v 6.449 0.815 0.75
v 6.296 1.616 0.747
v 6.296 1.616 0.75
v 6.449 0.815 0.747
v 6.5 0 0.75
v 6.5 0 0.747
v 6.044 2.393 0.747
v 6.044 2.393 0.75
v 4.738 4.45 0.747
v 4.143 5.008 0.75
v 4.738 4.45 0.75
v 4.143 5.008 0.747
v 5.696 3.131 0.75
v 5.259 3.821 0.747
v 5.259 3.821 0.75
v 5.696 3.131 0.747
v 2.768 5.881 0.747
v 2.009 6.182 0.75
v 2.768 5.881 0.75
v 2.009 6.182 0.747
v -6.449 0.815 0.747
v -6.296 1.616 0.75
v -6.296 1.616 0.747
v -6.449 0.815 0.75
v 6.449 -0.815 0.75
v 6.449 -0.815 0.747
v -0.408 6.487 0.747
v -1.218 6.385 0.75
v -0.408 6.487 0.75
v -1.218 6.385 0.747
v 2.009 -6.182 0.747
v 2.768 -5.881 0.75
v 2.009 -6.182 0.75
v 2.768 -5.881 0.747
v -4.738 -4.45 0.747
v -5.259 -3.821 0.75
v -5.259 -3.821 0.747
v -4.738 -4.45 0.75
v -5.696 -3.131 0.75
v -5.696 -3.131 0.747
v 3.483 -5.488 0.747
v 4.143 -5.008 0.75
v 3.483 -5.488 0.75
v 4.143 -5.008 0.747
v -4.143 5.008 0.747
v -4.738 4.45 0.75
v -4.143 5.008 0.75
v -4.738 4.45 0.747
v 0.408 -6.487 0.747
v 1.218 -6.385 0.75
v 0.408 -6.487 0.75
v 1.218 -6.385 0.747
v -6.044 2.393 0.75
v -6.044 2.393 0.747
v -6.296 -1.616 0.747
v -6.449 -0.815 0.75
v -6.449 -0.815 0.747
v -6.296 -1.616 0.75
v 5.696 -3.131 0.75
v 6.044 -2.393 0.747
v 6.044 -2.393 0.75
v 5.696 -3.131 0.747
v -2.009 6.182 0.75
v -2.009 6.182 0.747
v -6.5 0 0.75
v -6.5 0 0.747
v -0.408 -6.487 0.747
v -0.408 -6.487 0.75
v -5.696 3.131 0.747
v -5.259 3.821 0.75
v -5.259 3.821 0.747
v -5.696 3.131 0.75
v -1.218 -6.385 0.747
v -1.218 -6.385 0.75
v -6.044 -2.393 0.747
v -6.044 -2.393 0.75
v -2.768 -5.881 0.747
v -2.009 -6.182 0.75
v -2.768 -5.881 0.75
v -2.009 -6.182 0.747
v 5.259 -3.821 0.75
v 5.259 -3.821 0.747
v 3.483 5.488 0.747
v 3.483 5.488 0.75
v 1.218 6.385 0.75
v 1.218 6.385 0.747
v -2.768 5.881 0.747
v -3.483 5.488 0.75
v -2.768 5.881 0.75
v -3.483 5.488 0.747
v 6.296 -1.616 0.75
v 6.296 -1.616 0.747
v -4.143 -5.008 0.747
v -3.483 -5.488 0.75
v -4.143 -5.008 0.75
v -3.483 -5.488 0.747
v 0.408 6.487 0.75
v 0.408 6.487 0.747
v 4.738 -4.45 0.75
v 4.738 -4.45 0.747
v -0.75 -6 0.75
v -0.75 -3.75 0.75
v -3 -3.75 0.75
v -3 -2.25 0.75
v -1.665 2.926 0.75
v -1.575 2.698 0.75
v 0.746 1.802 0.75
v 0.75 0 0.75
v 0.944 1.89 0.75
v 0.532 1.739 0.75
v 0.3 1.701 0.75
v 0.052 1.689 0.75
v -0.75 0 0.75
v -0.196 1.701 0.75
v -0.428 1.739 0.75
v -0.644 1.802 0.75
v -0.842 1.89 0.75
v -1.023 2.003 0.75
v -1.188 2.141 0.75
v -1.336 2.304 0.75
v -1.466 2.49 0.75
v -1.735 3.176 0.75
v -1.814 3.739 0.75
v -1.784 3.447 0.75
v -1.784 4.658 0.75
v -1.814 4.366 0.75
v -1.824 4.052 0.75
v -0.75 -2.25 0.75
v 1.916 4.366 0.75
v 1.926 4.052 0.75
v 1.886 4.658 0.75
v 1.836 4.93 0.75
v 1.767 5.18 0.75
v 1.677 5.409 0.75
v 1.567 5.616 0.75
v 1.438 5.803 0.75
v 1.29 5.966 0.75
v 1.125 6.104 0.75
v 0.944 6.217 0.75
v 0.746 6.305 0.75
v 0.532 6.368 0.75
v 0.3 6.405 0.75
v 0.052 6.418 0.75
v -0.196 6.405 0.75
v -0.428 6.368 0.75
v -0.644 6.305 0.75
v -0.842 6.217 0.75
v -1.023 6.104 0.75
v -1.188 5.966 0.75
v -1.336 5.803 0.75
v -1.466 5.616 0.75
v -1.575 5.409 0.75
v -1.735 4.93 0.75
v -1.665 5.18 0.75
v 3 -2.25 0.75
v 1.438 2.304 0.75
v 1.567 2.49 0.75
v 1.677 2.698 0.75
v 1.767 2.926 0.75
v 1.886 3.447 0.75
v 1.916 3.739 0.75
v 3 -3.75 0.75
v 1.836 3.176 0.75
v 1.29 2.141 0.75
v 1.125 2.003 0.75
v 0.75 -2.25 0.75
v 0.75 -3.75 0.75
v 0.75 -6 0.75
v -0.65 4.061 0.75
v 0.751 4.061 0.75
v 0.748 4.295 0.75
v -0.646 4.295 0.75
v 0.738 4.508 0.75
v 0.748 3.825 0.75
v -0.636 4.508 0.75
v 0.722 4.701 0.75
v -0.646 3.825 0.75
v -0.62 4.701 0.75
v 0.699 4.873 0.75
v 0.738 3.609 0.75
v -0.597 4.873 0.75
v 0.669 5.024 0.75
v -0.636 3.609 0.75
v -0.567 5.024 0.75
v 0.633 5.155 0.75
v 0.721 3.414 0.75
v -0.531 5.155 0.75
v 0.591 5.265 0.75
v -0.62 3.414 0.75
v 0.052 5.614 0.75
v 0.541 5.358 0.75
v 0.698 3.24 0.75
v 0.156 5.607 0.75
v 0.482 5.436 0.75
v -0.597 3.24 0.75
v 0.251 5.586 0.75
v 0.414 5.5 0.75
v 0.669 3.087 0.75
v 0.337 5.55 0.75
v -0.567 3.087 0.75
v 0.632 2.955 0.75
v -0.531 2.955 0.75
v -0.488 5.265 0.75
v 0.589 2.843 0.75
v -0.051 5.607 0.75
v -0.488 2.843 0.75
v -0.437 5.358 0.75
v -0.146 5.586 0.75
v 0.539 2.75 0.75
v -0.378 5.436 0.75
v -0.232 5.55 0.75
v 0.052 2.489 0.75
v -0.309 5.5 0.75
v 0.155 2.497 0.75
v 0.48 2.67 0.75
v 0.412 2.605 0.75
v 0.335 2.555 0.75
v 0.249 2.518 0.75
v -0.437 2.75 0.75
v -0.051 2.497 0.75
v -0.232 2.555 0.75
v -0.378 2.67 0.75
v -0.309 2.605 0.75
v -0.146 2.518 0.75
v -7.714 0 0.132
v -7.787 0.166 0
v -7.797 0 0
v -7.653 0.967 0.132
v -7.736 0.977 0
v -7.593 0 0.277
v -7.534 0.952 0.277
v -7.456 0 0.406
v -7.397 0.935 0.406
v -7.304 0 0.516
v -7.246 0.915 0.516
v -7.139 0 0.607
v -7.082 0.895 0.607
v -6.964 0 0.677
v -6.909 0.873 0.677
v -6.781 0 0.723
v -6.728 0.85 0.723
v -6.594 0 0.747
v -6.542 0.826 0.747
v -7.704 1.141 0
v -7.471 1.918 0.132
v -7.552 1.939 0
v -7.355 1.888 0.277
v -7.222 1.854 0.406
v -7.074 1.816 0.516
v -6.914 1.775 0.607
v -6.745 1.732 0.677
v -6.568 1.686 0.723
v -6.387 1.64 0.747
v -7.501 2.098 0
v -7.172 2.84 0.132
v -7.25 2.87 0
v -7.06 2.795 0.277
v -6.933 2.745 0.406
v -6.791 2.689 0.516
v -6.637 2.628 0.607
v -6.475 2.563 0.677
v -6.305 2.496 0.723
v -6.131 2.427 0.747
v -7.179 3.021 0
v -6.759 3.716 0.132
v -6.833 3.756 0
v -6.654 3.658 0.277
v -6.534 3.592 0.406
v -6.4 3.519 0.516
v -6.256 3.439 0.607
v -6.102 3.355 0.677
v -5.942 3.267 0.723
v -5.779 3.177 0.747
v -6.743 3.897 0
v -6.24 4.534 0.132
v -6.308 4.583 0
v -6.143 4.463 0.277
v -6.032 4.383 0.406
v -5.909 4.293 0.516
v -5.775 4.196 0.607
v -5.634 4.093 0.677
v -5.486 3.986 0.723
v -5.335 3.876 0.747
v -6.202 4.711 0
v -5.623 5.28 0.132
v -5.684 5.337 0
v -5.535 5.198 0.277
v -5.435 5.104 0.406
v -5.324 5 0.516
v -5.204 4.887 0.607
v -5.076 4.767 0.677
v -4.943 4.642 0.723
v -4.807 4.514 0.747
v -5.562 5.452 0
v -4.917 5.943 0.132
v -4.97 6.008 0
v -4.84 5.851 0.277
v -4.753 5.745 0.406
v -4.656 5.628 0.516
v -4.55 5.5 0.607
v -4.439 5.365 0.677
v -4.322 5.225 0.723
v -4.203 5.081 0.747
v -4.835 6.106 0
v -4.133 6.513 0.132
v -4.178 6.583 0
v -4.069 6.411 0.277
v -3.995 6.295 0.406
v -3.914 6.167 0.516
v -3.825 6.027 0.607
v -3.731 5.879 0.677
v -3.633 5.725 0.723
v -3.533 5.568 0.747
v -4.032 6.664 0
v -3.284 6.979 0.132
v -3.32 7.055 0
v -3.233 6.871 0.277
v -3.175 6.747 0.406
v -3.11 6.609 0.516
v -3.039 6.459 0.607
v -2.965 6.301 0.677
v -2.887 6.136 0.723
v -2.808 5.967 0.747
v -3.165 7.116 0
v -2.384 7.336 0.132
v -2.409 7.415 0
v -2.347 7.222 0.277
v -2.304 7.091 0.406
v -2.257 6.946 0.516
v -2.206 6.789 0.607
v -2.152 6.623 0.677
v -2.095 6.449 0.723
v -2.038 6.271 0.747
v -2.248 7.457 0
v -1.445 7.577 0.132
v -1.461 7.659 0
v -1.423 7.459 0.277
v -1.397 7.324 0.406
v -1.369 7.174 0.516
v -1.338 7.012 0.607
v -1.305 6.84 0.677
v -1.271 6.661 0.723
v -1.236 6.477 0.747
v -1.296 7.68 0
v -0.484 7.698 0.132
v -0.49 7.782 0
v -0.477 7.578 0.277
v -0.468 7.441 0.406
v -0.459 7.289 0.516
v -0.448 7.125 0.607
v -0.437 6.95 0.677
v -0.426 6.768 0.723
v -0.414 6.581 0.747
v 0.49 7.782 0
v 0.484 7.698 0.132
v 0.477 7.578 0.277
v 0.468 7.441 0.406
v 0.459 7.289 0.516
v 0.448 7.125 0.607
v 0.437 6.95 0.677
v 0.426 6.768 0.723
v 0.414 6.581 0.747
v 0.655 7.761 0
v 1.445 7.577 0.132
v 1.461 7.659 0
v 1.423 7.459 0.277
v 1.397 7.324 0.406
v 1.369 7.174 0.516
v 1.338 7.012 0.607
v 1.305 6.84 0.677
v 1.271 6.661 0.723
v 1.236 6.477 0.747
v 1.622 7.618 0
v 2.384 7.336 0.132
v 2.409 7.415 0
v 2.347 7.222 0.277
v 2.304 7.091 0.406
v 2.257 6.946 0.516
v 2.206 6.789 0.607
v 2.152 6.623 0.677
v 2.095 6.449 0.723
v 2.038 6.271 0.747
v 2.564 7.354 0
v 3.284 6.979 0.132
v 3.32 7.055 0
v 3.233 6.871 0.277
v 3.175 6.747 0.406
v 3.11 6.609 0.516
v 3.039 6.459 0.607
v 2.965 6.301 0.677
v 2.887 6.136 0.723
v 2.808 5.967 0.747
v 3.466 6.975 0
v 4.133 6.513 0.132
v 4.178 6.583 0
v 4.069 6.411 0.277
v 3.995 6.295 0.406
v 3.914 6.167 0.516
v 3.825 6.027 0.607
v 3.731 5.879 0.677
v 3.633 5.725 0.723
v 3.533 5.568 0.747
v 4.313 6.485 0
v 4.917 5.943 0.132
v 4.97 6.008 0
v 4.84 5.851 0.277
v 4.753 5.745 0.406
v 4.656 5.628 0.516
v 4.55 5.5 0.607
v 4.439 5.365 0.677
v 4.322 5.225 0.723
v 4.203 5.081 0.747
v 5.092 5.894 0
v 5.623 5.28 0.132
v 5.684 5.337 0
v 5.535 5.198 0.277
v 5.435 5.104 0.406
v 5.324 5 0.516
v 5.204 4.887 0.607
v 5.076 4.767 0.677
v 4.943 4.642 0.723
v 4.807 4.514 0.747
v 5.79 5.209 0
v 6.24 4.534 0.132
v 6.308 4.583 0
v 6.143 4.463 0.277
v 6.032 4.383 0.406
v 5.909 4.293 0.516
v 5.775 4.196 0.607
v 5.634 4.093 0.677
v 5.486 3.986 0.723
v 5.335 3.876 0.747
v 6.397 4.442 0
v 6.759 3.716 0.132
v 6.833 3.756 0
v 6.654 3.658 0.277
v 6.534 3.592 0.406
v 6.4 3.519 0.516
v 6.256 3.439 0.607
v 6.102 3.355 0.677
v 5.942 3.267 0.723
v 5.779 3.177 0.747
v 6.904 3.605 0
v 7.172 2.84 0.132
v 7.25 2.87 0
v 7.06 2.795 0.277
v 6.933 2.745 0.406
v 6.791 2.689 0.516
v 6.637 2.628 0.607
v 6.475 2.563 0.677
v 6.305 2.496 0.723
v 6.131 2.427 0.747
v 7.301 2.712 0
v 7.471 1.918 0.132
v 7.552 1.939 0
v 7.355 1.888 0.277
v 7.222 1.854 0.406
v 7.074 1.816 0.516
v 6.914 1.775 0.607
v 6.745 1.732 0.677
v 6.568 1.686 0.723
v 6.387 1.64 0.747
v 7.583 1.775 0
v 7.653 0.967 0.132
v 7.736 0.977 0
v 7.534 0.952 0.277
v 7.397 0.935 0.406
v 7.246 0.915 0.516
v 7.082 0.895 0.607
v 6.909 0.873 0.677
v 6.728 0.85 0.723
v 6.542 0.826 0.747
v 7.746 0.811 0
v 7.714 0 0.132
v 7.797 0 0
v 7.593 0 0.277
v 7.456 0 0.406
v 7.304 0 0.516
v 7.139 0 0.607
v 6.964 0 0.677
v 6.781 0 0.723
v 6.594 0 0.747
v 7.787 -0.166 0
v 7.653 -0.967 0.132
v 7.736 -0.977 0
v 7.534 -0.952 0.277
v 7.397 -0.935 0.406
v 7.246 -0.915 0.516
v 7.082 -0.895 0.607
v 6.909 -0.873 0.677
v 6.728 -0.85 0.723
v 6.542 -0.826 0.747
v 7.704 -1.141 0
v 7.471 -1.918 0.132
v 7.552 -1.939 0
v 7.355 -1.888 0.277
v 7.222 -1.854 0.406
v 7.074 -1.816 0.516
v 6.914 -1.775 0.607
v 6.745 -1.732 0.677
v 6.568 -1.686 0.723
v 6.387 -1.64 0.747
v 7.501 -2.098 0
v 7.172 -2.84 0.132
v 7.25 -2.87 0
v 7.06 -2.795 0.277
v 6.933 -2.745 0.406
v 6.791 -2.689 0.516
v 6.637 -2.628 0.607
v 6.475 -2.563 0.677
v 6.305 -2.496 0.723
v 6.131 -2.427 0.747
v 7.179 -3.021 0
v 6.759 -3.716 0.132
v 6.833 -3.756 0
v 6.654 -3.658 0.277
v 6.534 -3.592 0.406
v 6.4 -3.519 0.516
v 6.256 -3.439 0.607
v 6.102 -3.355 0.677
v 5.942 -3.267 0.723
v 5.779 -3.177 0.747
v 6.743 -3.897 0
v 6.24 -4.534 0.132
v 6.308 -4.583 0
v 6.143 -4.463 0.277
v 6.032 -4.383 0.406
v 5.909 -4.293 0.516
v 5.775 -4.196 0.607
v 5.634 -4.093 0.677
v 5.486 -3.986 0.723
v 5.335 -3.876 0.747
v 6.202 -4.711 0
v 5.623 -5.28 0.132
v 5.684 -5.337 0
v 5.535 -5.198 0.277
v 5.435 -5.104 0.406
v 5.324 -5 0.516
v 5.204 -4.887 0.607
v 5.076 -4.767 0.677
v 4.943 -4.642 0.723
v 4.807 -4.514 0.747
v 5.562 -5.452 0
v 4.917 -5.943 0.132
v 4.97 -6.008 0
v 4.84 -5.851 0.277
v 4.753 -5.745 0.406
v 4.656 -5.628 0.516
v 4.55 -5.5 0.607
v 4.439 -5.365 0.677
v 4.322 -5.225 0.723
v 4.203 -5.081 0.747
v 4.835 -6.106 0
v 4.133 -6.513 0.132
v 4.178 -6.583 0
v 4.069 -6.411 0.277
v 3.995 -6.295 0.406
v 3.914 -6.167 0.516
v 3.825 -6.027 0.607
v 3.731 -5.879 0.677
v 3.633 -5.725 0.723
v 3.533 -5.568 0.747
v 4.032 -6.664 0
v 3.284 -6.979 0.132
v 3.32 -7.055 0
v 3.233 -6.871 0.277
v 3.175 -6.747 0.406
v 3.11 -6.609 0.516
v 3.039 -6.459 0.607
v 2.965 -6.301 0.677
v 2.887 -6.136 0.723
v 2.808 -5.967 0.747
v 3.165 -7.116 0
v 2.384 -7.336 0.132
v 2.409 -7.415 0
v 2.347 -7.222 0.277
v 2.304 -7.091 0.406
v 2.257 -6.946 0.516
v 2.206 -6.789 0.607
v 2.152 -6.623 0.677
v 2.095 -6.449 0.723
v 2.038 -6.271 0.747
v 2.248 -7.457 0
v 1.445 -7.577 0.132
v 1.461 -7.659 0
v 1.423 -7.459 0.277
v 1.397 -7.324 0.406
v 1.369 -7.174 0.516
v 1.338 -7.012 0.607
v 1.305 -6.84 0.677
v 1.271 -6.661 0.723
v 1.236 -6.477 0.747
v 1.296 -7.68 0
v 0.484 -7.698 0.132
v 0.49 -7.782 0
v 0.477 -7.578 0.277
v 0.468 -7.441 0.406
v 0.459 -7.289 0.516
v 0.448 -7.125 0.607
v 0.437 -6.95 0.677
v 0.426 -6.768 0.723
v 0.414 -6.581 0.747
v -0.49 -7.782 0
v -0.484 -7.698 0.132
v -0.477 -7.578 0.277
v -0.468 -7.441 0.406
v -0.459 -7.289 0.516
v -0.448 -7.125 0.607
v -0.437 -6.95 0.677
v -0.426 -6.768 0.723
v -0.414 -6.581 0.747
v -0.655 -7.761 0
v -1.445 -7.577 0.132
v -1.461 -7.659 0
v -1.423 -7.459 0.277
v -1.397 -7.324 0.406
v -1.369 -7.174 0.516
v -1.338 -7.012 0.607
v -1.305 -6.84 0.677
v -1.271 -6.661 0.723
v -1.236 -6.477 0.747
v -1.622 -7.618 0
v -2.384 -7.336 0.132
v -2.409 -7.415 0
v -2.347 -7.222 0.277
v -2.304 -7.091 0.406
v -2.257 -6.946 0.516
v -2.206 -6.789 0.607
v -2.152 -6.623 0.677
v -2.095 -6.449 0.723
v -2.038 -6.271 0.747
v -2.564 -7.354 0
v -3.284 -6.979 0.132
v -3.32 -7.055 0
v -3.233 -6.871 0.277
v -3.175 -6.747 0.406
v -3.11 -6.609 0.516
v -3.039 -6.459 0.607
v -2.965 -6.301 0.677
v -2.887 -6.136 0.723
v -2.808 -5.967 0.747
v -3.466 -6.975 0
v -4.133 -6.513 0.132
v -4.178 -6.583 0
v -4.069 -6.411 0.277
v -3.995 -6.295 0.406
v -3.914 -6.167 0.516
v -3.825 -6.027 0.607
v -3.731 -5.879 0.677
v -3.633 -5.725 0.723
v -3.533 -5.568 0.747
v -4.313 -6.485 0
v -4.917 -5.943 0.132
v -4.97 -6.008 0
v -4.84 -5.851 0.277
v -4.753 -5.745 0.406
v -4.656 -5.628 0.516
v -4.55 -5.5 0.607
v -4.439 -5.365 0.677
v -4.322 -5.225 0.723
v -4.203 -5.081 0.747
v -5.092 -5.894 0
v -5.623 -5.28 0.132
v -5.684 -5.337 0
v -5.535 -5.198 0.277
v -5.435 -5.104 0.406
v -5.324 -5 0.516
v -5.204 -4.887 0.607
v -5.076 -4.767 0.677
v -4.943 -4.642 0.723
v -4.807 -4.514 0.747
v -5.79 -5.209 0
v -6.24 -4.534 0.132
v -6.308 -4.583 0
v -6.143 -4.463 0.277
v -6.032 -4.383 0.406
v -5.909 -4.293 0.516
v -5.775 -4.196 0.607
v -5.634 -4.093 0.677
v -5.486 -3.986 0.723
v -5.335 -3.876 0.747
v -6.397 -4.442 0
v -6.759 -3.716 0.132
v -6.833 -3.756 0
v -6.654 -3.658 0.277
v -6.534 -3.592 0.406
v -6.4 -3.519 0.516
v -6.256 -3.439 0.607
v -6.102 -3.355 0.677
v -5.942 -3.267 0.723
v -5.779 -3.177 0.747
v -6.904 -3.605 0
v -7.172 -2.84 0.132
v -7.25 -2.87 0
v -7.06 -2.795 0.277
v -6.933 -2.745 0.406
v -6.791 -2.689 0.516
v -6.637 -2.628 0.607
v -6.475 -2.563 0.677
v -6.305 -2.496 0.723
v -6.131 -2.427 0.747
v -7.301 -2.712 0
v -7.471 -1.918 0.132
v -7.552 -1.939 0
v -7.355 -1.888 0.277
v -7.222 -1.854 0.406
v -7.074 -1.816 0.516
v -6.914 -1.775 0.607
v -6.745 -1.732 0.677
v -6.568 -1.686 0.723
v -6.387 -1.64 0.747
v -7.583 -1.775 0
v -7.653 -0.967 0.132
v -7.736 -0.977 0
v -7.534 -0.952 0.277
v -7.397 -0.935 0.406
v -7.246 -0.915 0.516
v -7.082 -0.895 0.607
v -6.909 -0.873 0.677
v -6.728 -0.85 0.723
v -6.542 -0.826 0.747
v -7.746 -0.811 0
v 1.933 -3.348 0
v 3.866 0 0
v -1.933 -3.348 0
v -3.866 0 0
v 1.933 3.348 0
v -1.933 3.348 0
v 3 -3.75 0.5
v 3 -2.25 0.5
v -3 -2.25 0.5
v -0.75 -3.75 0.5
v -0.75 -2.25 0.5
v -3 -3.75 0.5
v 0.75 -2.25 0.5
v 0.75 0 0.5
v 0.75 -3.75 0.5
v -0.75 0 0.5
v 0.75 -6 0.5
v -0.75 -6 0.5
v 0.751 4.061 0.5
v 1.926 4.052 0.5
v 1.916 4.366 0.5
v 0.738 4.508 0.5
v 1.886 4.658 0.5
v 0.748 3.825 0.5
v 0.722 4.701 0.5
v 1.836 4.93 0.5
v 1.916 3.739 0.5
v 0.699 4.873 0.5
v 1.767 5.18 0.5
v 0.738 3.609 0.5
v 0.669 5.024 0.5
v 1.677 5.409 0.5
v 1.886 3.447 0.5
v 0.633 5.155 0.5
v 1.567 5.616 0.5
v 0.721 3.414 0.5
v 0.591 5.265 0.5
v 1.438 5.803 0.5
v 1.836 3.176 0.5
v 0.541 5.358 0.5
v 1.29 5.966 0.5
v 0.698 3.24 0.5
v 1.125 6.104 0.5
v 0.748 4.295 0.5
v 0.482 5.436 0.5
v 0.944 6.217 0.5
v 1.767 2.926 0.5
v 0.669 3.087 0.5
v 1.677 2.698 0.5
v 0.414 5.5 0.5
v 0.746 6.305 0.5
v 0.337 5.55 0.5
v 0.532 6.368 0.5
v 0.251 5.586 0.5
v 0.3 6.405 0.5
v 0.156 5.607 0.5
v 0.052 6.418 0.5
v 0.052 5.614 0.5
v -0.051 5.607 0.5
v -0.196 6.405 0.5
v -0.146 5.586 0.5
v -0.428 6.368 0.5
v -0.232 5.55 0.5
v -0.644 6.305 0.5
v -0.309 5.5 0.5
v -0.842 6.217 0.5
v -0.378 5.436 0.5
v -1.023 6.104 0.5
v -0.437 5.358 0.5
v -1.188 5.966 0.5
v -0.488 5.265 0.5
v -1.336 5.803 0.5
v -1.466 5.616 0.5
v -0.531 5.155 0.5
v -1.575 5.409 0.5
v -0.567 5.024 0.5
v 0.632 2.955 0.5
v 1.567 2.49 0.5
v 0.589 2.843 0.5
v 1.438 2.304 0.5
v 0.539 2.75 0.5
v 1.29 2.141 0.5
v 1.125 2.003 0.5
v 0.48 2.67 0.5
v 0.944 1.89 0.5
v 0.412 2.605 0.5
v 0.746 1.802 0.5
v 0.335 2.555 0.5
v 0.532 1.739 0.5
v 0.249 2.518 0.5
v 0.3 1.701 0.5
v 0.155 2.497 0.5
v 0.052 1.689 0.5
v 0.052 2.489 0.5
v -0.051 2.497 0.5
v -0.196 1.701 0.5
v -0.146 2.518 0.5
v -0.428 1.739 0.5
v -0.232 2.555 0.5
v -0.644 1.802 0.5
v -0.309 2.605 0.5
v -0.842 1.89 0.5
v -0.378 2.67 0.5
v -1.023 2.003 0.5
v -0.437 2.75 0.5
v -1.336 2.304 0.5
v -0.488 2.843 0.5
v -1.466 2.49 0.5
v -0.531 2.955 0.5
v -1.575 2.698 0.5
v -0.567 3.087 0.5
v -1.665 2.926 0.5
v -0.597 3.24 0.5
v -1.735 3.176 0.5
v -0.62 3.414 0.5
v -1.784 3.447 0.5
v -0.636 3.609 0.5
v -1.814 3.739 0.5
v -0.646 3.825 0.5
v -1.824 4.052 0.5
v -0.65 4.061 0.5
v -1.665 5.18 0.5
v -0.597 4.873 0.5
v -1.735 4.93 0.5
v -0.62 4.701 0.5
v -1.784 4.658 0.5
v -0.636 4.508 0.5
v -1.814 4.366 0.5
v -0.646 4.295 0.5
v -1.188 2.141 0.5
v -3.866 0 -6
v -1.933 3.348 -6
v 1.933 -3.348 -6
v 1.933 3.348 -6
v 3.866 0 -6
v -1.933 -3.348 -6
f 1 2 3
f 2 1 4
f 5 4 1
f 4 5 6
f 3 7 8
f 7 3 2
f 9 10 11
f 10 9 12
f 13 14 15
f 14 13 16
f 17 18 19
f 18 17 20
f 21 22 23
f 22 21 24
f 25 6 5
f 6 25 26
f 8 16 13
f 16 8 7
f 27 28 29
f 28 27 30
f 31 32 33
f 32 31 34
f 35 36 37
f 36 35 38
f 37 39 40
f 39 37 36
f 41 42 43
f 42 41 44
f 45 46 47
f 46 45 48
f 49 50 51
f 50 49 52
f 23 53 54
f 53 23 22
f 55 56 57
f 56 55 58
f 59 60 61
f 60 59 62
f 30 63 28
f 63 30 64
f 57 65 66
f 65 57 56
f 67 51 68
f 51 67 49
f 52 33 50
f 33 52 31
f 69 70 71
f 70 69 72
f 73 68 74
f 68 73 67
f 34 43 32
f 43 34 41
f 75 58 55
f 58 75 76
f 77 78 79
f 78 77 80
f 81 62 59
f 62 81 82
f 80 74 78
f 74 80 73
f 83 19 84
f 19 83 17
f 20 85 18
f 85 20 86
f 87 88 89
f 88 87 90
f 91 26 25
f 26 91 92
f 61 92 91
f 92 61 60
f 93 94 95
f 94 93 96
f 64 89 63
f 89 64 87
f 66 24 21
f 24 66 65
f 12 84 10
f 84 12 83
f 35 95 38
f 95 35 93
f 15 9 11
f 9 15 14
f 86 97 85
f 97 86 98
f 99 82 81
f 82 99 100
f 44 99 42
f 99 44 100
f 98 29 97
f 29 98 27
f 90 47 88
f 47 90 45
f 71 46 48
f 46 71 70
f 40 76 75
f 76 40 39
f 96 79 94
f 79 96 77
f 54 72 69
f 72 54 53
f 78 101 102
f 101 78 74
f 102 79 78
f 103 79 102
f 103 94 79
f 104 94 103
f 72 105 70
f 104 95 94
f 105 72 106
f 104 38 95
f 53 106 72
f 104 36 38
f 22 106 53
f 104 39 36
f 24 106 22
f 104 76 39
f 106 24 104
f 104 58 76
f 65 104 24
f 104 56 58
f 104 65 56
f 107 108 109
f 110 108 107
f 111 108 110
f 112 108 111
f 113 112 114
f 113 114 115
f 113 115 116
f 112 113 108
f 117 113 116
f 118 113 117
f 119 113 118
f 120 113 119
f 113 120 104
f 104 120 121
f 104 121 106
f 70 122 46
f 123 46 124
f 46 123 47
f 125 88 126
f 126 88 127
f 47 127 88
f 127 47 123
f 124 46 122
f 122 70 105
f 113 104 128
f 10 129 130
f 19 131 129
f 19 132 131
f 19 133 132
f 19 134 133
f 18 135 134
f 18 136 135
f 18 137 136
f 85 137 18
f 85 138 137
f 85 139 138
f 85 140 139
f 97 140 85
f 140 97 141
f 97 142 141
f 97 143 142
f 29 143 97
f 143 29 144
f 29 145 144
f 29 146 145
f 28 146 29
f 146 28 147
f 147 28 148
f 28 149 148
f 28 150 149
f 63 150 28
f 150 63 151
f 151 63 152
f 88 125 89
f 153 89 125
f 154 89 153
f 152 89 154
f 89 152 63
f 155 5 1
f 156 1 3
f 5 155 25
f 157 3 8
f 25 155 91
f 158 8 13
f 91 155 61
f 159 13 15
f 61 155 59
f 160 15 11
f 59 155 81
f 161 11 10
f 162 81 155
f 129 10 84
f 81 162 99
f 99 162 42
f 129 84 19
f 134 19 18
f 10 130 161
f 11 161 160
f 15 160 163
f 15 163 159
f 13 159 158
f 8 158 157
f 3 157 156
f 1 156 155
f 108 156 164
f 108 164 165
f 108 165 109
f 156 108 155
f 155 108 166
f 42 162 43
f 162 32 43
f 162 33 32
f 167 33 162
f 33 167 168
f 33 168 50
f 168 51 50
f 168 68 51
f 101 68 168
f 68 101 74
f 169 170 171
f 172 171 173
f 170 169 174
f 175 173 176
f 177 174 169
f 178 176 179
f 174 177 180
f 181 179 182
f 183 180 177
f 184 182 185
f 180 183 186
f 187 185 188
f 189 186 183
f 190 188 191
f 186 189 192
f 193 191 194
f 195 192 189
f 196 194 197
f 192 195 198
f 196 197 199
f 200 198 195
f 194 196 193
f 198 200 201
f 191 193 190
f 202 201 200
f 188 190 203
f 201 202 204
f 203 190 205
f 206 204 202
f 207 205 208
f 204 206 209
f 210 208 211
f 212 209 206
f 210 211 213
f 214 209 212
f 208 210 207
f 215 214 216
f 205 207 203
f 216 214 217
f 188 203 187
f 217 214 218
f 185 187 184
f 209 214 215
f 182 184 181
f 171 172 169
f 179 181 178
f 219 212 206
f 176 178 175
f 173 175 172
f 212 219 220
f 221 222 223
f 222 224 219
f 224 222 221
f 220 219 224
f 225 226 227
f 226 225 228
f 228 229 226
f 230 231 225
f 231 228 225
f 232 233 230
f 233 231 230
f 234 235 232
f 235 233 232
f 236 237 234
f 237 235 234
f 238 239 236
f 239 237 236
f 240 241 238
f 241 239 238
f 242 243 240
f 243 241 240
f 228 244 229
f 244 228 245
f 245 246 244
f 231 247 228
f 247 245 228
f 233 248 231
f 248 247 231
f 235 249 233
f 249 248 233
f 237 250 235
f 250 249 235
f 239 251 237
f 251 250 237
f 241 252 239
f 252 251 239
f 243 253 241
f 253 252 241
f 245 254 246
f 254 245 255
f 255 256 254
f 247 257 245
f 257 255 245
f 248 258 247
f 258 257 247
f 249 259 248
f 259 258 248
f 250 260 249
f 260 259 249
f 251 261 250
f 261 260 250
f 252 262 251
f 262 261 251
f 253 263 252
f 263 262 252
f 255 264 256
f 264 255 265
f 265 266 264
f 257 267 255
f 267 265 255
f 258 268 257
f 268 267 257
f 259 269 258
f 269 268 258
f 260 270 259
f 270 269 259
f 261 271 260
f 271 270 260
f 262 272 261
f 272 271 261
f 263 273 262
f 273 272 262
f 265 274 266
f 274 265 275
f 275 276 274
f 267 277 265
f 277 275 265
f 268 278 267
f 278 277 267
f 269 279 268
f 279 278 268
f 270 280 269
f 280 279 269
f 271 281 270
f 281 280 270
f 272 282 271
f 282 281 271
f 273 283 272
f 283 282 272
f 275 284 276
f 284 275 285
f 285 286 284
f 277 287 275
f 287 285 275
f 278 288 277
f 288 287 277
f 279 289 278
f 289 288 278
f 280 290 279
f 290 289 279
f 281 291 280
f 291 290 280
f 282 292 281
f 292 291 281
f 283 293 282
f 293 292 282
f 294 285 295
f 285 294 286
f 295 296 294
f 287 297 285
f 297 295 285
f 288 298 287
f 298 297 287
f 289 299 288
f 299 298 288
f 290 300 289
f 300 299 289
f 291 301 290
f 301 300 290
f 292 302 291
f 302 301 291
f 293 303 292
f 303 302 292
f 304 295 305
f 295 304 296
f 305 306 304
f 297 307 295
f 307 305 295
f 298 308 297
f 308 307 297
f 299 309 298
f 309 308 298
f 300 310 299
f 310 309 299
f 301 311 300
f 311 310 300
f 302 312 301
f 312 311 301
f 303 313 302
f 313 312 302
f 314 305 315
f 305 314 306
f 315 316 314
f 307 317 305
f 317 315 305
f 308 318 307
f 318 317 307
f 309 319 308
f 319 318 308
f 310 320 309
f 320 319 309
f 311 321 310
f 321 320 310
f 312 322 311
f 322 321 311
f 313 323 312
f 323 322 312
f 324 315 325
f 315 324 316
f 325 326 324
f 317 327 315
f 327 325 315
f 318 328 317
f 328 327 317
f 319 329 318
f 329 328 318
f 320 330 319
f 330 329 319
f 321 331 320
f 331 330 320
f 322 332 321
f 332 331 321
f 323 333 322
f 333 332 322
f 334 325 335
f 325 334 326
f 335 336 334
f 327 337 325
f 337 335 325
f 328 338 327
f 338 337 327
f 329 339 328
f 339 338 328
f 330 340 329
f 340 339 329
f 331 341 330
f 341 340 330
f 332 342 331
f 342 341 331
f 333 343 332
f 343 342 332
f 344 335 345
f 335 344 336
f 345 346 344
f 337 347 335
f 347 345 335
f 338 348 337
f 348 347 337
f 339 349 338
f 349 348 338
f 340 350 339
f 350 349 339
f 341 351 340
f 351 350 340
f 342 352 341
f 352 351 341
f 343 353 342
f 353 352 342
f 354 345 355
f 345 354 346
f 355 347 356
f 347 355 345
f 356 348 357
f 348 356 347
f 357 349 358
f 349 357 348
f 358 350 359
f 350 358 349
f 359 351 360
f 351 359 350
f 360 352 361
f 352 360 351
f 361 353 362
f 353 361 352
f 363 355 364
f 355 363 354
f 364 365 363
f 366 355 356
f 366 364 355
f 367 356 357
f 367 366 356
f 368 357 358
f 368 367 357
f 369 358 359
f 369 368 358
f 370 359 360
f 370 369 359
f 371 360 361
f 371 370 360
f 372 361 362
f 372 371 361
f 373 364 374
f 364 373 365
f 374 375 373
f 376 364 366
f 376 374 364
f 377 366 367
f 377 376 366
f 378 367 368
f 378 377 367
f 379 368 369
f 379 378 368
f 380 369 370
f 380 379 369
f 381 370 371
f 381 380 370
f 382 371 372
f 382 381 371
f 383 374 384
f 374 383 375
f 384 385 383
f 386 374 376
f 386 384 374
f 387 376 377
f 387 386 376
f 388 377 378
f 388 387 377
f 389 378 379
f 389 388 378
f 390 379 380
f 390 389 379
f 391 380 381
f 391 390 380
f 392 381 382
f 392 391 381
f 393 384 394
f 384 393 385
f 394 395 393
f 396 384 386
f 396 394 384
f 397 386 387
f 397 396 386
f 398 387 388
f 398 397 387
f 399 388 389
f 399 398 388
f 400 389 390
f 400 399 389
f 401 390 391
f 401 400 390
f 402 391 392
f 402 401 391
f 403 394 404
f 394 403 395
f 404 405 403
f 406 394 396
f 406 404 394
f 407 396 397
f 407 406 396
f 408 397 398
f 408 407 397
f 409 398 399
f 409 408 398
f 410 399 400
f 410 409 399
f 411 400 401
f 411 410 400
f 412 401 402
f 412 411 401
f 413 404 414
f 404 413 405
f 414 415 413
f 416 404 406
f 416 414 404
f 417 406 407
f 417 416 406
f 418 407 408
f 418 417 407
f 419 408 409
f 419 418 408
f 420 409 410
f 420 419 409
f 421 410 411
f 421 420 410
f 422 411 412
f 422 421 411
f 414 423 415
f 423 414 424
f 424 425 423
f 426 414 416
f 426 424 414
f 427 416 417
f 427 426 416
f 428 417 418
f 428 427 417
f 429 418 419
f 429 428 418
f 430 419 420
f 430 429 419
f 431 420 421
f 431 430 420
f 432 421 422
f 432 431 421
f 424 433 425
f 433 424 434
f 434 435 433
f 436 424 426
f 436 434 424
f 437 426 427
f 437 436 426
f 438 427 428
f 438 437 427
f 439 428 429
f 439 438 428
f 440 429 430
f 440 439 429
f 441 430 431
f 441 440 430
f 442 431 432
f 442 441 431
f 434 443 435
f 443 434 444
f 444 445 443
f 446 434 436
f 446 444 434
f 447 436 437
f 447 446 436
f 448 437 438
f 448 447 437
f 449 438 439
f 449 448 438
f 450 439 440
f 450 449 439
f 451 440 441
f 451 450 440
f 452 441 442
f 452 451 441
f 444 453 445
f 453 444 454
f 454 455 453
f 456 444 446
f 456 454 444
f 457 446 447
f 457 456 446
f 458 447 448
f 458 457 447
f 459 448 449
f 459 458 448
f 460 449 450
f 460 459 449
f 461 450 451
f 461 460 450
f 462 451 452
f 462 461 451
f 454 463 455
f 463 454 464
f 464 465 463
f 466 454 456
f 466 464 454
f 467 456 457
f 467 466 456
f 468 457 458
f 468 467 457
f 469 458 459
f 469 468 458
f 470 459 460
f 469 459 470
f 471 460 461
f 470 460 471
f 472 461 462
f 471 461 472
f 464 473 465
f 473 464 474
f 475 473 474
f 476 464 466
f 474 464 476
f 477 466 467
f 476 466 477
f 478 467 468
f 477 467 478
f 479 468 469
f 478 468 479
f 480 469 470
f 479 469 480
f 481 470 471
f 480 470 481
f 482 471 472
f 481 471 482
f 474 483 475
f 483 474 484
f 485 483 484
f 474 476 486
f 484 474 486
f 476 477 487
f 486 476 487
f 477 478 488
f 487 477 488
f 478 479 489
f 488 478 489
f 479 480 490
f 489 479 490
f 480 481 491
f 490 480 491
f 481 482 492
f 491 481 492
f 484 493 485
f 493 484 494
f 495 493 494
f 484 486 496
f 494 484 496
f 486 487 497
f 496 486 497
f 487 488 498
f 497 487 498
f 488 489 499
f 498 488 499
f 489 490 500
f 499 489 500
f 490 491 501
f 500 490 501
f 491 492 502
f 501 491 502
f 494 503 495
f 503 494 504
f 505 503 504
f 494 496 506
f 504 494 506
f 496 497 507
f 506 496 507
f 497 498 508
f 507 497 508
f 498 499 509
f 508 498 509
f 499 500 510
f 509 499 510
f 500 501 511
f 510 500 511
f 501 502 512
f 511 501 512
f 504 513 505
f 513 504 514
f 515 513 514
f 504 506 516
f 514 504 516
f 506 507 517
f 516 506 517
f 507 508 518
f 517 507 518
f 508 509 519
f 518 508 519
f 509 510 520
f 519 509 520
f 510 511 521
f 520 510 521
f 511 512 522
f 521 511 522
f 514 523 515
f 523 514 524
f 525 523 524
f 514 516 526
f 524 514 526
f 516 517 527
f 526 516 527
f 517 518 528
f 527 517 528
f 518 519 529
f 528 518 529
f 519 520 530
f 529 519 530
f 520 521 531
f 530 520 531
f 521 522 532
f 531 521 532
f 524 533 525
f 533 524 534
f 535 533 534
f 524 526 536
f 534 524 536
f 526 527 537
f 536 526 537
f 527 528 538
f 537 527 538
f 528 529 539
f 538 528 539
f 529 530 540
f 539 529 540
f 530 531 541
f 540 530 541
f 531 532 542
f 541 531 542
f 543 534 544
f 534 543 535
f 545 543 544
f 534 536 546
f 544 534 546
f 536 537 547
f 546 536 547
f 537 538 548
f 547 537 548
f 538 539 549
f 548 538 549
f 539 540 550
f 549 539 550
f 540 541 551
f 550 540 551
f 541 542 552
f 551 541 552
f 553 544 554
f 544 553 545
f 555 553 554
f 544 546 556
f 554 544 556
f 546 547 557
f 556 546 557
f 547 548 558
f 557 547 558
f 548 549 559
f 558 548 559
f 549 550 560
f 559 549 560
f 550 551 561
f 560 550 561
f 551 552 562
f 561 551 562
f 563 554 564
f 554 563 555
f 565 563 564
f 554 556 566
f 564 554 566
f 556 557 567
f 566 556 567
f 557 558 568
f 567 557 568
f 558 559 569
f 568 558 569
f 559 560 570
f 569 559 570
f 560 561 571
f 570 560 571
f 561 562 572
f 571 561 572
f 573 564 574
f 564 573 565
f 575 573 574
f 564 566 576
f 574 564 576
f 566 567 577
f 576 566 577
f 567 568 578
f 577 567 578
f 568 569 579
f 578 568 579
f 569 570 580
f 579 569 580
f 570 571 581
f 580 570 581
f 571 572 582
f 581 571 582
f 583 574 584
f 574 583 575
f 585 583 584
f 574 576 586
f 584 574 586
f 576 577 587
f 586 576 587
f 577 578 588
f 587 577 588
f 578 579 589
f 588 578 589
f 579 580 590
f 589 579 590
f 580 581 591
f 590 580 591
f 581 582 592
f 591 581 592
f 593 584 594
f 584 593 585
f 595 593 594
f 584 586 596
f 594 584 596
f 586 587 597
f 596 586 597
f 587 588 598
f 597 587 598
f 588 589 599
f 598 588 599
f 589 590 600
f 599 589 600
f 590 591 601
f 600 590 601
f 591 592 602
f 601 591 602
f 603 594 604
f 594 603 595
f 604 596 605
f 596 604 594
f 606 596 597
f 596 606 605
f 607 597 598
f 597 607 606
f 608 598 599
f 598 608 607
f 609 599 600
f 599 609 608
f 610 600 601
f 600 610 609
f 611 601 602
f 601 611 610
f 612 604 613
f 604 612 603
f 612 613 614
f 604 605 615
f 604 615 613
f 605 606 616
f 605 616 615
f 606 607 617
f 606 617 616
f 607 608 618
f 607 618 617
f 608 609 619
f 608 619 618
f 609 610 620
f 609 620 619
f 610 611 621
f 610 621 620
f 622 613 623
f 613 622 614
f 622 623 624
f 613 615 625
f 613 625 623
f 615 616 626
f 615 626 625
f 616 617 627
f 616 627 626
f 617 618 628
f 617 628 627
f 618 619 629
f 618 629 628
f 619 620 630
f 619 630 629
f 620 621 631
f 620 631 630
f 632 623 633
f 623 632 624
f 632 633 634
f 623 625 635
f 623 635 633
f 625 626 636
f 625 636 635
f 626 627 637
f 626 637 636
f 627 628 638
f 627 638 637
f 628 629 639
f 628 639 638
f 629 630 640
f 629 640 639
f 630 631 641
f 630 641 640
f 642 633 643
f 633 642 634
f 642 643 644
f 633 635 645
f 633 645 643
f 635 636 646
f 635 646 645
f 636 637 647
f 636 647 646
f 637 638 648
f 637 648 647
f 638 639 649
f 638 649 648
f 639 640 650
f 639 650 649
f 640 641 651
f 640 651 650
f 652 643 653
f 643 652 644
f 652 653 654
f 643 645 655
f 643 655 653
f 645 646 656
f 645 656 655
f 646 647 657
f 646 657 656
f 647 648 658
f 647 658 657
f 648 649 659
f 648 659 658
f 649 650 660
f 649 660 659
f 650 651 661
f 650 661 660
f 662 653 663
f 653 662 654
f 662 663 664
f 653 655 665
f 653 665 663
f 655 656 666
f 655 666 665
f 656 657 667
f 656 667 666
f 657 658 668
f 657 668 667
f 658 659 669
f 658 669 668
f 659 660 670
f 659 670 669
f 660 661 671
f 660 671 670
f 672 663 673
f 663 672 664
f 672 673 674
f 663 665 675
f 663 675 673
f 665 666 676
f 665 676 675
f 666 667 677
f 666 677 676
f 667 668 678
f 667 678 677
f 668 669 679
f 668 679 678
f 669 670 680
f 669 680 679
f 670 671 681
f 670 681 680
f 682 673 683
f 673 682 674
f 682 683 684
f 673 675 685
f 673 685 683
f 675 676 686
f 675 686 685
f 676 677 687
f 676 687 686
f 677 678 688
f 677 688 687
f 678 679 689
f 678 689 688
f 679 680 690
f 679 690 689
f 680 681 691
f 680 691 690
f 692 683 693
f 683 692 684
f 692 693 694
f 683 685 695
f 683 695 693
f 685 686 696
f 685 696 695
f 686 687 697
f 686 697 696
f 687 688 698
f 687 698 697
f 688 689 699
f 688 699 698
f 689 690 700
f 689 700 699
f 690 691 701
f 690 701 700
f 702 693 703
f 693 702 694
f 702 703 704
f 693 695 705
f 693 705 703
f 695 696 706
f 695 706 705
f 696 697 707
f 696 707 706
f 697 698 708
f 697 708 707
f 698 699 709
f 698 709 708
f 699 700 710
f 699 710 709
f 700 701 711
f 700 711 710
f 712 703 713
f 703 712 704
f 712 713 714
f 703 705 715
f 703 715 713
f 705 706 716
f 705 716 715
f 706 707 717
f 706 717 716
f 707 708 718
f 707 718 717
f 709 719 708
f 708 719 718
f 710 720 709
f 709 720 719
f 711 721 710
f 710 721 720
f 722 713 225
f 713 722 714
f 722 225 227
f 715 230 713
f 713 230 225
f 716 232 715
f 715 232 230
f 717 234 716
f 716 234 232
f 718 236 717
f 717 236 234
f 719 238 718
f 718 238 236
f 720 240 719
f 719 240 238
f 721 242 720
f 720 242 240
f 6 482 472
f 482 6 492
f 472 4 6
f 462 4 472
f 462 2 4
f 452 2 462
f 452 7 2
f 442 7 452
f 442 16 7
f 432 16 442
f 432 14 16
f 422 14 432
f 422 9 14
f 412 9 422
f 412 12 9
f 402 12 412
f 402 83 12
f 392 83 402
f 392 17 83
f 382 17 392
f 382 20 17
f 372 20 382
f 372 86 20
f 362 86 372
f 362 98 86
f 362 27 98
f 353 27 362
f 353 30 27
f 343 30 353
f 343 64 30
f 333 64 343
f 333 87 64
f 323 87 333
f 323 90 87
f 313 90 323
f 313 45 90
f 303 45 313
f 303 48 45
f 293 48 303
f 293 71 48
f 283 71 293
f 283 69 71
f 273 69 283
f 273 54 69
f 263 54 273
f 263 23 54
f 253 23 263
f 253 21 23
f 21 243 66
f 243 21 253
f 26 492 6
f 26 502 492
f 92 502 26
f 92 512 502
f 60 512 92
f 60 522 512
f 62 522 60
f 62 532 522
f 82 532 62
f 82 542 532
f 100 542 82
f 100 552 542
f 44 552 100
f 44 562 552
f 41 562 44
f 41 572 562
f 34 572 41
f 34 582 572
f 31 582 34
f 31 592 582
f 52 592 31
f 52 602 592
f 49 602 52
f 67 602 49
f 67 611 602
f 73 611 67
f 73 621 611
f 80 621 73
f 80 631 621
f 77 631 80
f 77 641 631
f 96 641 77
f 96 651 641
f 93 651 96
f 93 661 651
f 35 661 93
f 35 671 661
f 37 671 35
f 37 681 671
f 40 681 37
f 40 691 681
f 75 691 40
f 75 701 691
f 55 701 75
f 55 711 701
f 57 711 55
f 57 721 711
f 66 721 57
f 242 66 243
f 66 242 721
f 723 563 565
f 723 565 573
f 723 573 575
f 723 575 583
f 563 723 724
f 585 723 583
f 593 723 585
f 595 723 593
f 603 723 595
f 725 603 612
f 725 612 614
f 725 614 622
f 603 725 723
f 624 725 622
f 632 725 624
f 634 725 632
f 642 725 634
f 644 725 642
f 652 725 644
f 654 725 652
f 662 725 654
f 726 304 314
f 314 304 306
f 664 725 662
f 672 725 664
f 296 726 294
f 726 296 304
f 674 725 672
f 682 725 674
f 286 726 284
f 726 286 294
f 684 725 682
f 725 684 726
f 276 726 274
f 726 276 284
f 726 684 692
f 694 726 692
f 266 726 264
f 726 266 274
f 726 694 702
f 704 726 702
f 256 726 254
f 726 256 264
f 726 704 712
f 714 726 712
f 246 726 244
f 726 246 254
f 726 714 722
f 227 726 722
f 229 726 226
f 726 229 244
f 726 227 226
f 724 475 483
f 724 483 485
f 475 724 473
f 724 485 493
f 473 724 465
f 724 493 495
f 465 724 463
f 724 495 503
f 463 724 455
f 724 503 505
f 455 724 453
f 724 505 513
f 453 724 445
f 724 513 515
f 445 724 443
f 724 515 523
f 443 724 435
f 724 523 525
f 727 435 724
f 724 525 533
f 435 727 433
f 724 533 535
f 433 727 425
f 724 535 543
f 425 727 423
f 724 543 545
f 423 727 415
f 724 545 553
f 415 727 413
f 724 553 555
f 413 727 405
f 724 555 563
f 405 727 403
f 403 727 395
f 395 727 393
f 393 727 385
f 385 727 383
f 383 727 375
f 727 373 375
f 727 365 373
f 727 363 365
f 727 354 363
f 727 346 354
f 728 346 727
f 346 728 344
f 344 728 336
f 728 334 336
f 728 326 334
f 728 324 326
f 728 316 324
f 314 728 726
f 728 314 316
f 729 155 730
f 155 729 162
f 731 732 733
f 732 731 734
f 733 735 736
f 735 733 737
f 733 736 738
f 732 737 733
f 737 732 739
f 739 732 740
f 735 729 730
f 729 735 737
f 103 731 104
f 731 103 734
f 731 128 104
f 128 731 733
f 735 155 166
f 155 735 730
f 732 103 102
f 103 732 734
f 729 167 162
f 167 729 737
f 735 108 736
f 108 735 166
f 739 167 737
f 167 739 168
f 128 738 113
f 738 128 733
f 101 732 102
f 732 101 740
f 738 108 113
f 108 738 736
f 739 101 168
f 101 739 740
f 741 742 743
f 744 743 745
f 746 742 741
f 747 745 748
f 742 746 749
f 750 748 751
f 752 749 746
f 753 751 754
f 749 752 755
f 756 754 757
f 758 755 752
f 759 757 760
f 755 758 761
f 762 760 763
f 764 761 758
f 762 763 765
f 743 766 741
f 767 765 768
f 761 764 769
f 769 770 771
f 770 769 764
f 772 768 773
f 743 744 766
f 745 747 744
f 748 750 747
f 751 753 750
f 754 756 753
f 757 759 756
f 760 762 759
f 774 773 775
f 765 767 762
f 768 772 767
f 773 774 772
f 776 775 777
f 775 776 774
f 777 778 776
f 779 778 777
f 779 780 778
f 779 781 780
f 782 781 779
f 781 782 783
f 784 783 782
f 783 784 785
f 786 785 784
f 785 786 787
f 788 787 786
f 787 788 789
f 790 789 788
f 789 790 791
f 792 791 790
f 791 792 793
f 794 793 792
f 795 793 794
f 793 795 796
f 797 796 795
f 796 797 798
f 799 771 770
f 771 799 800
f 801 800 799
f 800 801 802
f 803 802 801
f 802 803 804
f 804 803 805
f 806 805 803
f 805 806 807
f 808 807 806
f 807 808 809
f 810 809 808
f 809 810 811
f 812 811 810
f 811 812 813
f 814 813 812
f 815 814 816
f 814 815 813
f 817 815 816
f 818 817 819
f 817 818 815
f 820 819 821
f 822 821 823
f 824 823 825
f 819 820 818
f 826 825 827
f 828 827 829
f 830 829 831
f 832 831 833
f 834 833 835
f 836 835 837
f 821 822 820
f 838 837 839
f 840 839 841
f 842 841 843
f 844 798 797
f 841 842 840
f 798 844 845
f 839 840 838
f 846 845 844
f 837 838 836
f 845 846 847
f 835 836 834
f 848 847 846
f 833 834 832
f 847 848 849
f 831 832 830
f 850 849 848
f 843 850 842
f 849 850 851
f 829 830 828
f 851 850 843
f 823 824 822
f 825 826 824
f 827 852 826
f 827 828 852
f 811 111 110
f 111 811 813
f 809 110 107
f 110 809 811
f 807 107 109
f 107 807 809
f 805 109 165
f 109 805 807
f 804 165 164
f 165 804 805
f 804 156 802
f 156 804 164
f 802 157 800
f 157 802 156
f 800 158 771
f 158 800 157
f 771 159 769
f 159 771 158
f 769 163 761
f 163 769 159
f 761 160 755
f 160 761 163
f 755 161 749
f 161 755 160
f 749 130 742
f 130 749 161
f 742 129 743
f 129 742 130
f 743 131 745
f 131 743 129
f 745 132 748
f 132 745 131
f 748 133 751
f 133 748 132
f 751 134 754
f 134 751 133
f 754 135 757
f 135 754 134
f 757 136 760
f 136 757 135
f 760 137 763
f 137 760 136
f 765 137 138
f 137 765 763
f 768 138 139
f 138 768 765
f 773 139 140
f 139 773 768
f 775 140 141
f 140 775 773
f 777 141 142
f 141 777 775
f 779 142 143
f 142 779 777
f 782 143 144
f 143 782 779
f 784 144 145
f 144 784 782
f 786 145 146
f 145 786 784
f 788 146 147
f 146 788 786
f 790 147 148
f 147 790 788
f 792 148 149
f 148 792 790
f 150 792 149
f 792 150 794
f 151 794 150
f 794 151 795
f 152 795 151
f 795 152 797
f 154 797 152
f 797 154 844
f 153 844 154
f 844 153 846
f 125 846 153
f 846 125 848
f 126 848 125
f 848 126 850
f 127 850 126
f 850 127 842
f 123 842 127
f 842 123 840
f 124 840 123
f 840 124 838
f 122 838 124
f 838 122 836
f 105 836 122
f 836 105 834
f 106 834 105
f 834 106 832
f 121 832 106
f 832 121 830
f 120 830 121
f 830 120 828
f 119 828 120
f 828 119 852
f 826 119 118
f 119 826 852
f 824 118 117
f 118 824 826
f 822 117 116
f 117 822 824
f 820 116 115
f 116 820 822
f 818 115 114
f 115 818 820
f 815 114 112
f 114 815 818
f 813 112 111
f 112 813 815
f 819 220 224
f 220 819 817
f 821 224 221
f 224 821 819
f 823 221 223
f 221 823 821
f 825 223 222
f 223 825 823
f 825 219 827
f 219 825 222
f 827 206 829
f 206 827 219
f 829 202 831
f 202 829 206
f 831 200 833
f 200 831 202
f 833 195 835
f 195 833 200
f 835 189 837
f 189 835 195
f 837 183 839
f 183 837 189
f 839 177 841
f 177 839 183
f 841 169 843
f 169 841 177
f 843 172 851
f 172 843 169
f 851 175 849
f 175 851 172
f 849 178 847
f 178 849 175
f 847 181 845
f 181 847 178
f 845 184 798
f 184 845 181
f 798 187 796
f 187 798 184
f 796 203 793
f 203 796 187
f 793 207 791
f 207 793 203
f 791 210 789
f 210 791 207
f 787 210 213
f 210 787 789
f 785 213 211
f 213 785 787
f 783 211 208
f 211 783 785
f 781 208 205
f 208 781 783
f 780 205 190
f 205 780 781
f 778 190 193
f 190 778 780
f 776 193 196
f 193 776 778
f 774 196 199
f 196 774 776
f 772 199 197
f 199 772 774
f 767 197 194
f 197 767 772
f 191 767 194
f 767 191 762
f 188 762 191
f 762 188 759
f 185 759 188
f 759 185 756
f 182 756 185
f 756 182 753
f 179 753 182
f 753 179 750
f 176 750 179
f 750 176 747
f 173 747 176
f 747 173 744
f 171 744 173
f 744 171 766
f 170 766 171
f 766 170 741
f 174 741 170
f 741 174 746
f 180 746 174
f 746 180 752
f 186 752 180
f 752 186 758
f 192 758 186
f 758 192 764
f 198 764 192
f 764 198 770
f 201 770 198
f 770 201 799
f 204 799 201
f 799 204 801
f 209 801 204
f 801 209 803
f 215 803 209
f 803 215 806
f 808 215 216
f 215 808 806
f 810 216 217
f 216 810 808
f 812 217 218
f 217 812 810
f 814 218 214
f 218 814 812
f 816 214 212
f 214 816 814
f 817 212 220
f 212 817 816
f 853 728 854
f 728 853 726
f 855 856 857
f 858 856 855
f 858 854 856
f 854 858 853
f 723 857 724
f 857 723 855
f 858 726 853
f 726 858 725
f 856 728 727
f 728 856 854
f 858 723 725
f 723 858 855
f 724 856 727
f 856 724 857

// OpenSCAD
$fn = 50;


union() {
	difference() {
		union() {
			translate(v = [0, 0, -0.7500000000]) {
				cylinder(h = 1.5000000000, r = 6.5000000000);
			}
			translate(v = [0, 0, -0.7500000000]) {
				rotate_extrude(angle = 360) {
					translate(v = [6.5000000000, 0, 0]) {
						circle(r = 1.5000000000);
					}
				}
			}
		}
		union() {
			translate(v = [-25.0000000000, -25.0000000000, -50]) {
				cube(size = [50, 50, 50]);
			}
			#translate(v = [-3.0000000000, -3.7500000000, 0.5000000000]) {
				cube(size = [6, 1.5000000000, 0.2500000000]);
			}
			#translate(v = [-0.7500000000, -6.0000000000, 0.5000000000]) {
				cube(size = [1.5000000000, 6, 0.2500000000]);
			}
			#translate(v = [0, 4, 0.5000000000]) {
				linear_extrude(height = 0.2500000000) {
					text(font = "SegoiUI:Bold", halign = "center", size = 4.5000000000, text = "0", valign = "center");
				}
			}
		}
	}
	union() {
		translate(v = [0, 0, -6]) {
			linear_extrude(height = 6) {
				polygon(points = [[3.8658550000, 0.0000000000], [1.9329275000, 3.3479286373], [-1.9329275000, 3.3479286373], [-3.8658550000, 0.0000000000], [-1.9329275000, -3.3479286373], [1.9329275000, -3.3479286373]]);
			}
		}
	}
}
